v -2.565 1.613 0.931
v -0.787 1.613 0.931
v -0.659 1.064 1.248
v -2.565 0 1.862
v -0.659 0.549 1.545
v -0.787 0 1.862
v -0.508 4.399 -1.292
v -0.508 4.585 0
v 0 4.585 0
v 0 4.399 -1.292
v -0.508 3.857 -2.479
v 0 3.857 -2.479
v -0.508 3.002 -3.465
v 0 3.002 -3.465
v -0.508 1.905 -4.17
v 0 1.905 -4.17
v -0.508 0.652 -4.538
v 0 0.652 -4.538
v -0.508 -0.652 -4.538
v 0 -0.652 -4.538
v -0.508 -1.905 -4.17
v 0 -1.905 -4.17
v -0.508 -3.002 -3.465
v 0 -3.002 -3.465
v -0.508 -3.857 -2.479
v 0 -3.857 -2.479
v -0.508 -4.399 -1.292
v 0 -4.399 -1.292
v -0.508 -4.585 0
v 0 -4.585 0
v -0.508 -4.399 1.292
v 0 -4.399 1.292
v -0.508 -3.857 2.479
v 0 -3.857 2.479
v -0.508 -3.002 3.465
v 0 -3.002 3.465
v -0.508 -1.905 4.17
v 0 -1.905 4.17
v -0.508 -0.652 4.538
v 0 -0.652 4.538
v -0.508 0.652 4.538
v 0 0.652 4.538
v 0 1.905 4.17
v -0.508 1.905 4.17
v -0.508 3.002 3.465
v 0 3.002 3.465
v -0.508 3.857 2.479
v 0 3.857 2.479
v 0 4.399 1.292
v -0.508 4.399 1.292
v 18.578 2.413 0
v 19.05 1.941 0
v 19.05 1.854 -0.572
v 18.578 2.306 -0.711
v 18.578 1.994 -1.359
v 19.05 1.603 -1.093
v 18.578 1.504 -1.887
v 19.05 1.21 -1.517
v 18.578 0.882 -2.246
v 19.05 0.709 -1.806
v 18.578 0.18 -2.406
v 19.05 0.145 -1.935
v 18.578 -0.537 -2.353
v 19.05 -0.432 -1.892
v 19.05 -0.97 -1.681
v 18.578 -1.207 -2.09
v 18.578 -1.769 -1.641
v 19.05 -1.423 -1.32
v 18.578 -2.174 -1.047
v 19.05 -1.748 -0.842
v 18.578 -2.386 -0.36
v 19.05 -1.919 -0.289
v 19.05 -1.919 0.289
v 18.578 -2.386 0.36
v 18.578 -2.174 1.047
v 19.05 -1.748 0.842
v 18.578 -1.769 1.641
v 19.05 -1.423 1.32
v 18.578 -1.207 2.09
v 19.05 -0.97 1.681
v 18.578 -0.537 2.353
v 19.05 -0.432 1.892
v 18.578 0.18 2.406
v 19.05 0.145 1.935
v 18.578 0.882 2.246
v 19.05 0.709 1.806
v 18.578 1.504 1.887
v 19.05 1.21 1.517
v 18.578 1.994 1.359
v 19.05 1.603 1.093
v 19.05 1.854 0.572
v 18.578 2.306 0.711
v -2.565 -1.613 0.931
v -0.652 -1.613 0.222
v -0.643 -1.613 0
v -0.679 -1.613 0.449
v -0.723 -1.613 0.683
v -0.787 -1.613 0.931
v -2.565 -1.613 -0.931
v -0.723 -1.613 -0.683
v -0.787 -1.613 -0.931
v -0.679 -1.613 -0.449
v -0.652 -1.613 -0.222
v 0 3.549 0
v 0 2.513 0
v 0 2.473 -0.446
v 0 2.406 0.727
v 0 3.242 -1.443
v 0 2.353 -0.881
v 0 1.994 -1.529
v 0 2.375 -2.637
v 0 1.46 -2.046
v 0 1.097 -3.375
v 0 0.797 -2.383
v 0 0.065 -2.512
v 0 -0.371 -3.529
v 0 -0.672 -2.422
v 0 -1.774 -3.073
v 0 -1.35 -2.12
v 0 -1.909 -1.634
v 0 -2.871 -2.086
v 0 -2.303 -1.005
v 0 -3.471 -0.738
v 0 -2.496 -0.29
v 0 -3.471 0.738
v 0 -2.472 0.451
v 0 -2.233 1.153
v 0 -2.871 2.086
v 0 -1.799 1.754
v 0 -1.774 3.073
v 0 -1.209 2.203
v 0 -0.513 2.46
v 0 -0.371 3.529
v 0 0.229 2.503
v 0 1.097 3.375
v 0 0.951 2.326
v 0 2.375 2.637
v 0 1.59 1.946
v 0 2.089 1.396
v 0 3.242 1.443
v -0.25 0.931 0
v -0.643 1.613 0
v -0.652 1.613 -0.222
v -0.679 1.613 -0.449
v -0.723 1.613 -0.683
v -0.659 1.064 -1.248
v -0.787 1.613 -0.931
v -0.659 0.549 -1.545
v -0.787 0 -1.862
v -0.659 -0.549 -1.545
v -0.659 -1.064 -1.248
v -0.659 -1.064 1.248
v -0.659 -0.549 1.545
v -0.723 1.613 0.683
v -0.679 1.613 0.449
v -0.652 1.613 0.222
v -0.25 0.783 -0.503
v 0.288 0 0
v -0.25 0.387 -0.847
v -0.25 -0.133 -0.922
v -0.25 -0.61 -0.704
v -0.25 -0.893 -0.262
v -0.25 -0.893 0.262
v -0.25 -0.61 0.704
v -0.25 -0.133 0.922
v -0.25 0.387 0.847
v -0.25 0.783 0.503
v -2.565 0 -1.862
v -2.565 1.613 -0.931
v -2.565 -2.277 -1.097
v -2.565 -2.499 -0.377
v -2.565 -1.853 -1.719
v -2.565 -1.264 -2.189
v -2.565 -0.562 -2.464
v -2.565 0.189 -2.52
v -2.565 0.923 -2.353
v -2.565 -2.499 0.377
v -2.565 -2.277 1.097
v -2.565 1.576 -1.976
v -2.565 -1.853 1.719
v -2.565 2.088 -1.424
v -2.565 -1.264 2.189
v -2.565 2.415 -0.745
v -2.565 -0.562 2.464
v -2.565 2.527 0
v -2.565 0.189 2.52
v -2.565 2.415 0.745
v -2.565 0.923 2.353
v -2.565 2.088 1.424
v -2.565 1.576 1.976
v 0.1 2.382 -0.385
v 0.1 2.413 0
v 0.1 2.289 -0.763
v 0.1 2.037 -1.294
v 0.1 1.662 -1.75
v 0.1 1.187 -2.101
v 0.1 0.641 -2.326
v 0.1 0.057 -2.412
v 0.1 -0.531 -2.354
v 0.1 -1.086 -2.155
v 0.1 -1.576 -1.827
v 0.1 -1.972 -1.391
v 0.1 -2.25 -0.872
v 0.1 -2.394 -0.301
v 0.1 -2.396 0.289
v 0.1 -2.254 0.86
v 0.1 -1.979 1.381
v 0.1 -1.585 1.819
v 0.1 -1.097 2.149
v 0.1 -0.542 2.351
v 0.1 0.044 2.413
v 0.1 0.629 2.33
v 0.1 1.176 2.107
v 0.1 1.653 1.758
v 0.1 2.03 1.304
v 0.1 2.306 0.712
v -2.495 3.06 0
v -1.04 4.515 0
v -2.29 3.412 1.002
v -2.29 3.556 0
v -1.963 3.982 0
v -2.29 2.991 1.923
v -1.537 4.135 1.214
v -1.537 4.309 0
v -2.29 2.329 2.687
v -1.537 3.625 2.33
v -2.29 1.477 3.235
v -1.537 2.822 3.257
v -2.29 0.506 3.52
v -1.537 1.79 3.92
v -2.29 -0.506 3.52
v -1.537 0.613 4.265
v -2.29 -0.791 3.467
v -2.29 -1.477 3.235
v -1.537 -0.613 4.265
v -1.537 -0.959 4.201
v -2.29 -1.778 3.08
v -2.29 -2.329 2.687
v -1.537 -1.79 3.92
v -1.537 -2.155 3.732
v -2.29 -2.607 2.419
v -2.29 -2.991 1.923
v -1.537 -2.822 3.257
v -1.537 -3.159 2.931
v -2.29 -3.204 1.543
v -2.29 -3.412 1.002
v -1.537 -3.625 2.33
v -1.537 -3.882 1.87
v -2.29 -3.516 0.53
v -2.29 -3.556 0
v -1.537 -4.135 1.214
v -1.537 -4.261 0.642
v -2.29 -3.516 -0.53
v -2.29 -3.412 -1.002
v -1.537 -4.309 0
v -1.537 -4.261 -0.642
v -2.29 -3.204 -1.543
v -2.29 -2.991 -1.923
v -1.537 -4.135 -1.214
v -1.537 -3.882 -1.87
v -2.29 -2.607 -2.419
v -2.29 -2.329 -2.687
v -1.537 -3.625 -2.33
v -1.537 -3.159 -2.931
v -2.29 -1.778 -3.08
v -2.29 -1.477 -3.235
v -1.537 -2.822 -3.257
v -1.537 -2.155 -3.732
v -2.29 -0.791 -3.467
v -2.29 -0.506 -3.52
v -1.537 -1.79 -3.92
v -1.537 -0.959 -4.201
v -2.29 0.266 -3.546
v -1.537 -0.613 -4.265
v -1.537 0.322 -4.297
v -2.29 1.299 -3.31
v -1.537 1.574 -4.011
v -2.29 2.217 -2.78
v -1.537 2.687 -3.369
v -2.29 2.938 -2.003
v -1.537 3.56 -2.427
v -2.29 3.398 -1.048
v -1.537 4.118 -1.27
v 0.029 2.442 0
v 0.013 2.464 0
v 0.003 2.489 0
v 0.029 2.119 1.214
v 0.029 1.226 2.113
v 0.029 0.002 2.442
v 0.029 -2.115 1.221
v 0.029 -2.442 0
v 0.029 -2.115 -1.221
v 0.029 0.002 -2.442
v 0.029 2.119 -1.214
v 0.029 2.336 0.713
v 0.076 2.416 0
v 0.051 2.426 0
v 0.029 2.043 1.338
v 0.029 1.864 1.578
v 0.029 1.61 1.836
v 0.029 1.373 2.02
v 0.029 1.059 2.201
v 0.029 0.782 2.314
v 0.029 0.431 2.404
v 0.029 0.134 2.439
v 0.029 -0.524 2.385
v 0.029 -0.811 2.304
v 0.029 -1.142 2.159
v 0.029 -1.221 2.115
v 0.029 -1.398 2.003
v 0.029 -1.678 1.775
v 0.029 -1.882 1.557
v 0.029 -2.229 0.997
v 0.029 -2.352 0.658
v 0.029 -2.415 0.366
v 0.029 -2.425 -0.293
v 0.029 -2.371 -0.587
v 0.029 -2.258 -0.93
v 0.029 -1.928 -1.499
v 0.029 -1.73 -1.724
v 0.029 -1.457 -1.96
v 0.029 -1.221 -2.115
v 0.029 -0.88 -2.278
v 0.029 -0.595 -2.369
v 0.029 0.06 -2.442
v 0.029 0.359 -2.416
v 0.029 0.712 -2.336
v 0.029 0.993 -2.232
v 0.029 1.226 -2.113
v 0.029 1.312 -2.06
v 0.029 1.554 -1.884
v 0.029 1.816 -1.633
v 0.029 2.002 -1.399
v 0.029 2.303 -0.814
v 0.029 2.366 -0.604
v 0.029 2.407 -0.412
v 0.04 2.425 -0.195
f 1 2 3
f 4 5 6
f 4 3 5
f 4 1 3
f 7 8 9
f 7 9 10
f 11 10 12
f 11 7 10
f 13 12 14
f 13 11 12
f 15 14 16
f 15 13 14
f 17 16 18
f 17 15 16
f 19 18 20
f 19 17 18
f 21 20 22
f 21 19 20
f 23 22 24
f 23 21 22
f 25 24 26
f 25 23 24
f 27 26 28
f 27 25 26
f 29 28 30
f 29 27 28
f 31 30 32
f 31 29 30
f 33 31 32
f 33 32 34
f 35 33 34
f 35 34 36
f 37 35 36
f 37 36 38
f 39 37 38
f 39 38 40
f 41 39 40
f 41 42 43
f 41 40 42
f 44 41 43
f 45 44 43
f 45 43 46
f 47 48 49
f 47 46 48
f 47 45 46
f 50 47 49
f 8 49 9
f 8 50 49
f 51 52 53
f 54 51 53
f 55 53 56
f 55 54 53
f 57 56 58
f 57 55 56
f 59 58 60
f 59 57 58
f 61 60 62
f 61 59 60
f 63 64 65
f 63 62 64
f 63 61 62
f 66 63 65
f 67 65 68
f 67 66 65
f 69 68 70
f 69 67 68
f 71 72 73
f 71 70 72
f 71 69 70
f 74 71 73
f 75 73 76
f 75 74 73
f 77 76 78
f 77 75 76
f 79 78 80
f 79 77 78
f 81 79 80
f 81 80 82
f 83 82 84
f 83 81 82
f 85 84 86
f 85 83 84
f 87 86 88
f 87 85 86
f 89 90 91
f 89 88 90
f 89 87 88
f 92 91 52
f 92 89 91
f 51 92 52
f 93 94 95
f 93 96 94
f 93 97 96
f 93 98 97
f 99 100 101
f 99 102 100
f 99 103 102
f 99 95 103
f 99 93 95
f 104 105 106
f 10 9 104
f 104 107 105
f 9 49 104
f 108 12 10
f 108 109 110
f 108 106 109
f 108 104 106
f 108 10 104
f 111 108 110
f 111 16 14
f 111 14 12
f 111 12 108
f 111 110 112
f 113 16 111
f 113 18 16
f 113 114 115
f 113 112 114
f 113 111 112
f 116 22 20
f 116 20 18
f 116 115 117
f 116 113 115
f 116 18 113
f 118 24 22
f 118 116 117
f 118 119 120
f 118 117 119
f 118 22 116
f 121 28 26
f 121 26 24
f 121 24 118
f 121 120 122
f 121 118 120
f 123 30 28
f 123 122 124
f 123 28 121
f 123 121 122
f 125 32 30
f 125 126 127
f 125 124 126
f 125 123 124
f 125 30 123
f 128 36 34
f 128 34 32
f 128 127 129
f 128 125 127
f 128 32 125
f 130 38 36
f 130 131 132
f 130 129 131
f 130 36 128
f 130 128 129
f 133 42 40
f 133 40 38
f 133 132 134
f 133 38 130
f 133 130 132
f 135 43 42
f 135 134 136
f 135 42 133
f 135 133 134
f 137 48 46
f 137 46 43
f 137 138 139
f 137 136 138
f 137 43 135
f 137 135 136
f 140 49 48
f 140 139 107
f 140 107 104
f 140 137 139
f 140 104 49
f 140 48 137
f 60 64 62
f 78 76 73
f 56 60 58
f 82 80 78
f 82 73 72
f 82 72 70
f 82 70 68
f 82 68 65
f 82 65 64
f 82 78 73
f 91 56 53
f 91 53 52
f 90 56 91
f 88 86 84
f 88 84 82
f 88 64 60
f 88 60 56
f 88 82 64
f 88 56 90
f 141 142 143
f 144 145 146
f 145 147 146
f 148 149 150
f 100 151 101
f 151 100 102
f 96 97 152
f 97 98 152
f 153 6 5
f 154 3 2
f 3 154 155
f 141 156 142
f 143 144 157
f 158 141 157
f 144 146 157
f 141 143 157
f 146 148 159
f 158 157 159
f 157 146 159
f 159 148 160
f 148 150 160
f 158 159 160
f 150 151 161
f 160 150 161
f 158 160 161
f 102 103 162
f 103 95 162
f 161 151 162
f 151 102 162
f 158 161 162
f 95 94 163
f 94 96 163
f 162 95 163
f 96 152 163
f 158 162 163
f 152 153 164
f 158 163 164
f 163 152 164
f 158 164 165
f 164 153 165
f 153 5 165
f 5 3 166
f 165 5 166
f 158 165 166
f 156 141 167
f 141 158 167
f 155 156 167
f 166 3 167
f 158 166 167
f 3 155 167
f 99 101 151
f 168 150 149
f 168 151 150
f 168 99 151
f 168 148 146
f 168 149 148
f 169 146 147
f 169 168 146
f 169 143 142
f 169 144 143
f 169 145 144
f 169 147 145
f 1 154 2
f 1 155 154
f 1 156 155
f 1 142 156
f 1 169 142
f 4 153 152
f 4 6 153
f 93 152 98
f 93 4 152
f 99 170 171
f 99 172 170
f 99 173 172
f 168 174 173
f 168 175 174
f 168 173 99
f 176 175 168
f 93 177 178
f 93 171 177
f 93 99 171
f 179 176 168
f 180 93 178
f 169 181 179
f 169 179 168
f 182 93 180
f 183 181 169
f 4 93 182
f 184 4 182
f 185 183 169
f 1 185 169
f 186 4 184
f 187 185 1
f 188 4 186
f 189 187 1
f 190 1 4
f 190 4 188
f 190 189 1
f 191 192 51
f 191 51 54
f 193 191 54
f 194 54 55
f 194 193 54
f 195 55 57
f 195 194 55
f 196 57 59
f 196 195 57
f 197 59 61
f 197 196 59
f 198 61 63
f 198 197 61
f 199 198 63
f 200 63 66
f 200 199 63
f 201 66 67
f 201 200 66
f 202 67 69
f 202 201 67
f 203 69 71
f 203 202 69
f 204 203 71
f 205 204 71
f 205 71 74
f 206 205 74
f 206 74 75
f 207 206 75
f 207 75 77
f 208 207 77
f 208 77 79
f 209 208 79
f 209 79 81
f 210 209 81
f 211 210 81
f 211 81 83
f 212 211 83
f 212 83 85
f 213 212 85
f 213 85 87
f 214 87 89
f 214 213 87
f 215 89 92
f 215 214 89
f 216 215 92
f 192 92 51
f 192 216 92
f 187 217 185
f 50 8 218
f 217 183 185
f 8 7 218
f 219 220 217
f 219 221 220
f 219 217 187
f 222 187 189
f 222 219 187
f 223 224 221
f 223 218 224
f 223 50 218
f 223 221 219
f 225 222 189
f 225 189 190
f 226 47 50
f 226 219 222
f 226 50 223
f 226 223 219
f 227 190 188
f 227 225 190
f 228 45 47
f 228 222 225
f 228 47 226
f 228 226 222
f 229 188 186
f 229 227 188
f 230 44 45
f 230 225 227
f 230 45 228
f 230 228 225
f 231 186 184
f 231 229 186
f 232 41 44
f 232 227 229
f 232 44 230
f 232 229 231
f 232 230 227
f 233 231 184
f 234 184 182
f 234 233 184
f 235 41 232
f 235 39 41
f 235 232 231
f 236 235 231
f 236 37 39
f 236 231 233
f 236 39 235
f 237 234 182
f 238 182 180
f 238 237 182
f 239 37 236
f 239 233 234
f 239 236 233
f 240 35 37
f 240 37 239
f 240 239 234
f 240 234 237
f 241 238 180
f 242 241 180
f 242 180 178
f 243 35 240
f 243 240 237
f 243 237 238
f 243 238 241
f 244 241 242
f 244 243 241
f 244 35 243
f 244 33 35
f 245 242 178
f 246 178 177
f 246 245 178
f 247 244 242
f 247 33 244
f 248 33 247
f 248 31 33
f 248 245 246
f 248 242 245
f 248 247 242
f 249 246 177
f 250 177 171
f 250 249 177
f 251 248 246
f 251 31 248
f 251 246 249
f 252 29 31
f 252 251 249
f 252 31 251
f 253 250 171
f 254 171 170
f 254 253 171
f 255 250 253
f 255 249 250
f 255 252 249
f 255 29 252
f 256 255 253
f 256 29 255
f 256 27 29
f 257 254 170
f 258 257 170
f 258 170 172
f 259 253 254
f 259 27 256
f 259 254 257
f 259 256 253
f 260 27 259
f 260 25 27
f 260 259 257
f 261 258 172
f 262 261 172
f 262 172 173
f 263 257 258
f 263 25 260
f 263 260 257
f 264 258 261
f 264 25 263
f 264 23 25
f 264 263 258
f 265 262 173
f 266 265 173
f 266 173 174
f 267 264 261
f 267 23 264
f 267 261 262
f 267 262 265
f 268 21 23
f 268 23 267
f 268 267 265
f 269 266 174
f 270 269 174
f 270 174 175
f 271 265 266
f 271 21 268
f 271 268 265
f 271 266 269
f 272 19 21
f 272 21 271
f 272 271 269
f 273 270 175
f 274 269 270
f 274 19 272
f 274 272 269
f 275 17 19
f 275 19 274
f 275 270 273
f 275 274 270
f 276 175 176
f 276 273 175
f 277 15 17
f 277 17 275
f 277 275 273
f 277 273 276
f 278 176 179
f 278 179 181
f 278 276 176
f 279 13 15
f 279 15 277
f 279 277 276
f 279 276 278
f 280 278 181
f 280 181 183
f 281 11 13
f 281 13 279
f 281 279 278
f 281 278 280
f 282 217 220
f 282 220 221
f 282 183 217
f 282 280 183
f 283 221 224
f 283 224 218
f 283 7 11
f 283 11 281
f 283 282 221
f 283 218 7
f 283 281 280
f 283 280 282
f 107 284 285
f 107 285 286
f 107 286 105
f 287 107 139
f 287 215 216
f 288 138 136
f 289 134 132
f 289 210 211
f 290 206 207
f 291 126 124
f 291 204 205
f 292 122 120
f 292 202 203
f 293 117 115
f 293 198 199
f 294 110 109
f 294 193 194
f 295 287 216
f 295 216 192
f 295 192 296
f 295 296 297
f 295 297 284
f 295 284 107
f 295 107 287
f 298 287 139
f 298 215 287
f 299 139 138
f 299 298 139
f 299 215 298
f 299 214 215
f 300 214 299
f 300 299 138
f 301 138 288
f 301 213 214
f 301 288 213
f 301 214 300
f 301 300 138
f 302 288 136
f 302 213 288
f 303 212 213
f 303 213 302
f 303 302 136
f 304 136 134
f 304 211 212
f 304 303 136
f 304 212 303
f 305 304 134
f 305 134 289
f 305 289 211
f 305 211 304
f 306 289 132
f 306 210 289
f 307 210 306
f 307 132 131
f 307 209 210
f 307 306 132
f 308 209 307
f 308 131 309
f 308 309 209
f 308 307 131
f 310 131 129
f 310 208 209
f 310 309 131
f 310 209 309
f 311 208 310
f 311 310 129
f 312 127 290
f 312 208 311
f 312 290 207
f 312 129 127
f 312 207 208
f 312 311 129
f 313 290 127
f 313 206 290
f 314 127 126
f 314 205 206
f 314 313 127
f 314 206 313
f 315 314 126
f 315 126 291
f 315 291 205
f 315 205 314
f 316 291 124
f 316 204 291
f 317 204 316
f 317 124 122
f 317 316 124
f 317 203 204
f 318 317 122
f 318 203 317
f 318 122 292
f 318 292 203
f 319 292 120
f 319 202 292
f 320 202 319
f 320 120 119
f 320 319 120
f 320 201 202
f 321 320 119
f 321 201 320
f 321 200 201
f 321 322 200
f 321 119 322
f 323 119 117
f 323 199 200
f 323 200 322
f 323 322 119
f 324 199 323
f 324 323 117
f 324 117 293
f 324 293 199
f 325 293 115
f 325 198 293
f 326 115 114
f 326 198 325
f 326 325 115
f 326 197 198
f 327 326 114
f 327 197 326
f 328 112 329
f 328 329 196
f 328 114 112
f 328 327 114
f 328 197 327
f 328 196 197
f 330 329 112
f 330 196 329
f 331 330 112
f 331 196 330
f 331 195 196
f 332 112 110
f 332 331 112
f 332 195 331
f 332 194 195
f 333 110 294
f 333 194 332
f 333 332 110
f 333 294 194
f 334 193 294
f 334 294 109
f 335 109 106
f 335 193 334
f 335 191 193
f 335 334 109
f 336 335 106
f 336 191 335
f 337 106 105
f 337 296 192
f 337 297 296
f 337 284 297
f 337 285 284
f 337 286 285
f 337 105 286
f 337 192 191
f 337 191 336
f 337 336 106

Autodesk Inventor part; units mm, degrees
ref_plane "YZ Plane" through (0, 0, 0) normal (1, 0, 0) x (0, 1, 0)
ref_plane "XZ Plane" through (0, 0, 0) normal (0, 1, 0) x (-1, 0, 0)
sketch "Sketch1" plane through (0, 0, 0) normal (0, 0, 1) x (1, 0, 0)
  line L0 (0.2879, 0) -> (19.05, 0)
  line L1 (19.05, 0) -> (19.05, 2.413)
  line L2 (19.05, 2.413) -> (2.1084, 2.413)
  line L3 (2.1084, 2.413) -> (0.0001, 2.413)
  line L4 (0.0001, 2.413) -> (0, 2.413)
  line L5 (0, 2.413) -> (0, 4.5847)
  line L6 (0, 4.5847) -> (-2.5654, 4.5847)
  line L7 (-2.5654, 4.5847) -> (-2.5654, 1.8624)
  line L8 (-2.5654, 1.8624) -> (-0.7874, 1.8624)
  line L9 (-0.7874, 1.8624) -> (0.2879, 0)
  line L10 (-6.8885, 0) -> (23.3731, 0) projected
  line L11 (0, -0.9169) -> (0, 5.5016) projected
  line L12 (2.1084, 2.413) -> (0, 2.413) construction
  dimension "d1" = 16.9416
  dimension "d2" = 2.1083
  dimension "d3" = 2.5654
  dimension "d4" = 1.778
  dimension "d5" = 60
  dimension "d6" = 4.826
  dimension "d7" = 4.826
  dimension "d8" = 3.7248
  dimension "d9" = 9.1694
  dimension "d26" = 19.05
revolve "Body" add sketch "Sketch1" angle 360 about axis through (0.2879, 0, 0) along (1, 0, 0) contours L9 L11 L3 L2 L1 L0 | L9 L8 L7 L6 L5 L11
sketch "Sketch2" plane through (-2.5654, 0, 0) normal (-1, 0, 0) x (0, 0, 1)
  circle A0 centre (0, 0) radius 1.8624 projected
  line L0 (0, -6.4186) -> (0, 6.4186) projected
  line L1 (-6.4186, 0) -> (6.4186, 0) projected
  line L2 (1.8624, 0) -> (0.9312, -1.6129)
  line L3 (0.9312, -1.6129) -> (-0.9312, -1.6129)
  line L4 (-0.9312, -1.6129) -> (-1.8624, 0)
  line L5 (-1.8624, 0) -> (-0.9312, 1.6129)
  line L6 (-0.9312, 1.6129) -> (0.9312, 1.6129)
  line L7 (0.9312, 1.6129) -> (1.8624, 0)
  point P0 (0, 0)
extrude "Slot" add sketch "Sketch2" against normal up to next contours L7 A0 | A0 L2 | L6 L0 A0 | A0 L0 L3 | L0 L6 A0 | A0 L3 L0 | L4 A0 | A0 L5
fillet "Fillet1" radius 2.0574 1 edges at (-2.5654, -4.5847, 0)
thread "Thread" size "10-32 UNF" class "2A" standard "ANSI Unified Screw Threads" length 16.9416
chamfer "Chamfer1" distance 0.4724 distance2 0.4724 1 edges at (19.05, -2.413, 0) measured on face at (19.05, -1.2173, -0.6389)
ref_plane "Work Plane1" through (29, 0, 0) normal (0, -1, 0) x (1, 0, 0)
fillet "Fillet2" radius 0.1 1 edges at (0.0001, -2.413, 0)
equation "\"d30\" = R"
equation "\"d17\" = RR"
equation "\"d13\" = GEL"
equation "\"d15\" = -0.5 * SPD + 0.5 * GD"
equation "\"d16\" = GUL"
equation "\"d1\" = GEL"
equation "\"d3\" = KOH"
equation "\"d4\" = INTI"
equation "\"d6\" = GD"
equation "\"d7\" = BDM"
equation "\"d8\" = 1.1547 * SW"
equation "\"d9\" = KOD"
equation "\"d26\" = NLG"
equation "\"GD\" = NND"
equation "\"NLG\" = 19.05"
equation "\"GEL\" = 16.9416"
equation "\"KOD\" = 9.1694"
equation "\"KOH\" = 2.5654"
equation "\"INTI\" = 1.778"
equation "\"GAL\" = 2.1082"
equation "\"GUL\" = 0.47244"
equation "\"BDM\" = NND"
equation "\"SW\" = 3.2258"
equation "\"RR\" = 2.0574"
equation "\"SPD\" = 3.88112"
equation "\"R\" = 0.1"
equation "\"TOA\" = 30deg"
equation "\"GD1\" = SPD"
equation "\"THREADDIA\" = 4.826"
equation "\"KOH1\" = 0.508"
equation "\"NND\" = 4.826"
equation "\"E0\" = 3.72593"
properties part number "ANSI B18.3 - No. 10-32 - 3/4, HSBHCSI" material "Steel, Mild"
